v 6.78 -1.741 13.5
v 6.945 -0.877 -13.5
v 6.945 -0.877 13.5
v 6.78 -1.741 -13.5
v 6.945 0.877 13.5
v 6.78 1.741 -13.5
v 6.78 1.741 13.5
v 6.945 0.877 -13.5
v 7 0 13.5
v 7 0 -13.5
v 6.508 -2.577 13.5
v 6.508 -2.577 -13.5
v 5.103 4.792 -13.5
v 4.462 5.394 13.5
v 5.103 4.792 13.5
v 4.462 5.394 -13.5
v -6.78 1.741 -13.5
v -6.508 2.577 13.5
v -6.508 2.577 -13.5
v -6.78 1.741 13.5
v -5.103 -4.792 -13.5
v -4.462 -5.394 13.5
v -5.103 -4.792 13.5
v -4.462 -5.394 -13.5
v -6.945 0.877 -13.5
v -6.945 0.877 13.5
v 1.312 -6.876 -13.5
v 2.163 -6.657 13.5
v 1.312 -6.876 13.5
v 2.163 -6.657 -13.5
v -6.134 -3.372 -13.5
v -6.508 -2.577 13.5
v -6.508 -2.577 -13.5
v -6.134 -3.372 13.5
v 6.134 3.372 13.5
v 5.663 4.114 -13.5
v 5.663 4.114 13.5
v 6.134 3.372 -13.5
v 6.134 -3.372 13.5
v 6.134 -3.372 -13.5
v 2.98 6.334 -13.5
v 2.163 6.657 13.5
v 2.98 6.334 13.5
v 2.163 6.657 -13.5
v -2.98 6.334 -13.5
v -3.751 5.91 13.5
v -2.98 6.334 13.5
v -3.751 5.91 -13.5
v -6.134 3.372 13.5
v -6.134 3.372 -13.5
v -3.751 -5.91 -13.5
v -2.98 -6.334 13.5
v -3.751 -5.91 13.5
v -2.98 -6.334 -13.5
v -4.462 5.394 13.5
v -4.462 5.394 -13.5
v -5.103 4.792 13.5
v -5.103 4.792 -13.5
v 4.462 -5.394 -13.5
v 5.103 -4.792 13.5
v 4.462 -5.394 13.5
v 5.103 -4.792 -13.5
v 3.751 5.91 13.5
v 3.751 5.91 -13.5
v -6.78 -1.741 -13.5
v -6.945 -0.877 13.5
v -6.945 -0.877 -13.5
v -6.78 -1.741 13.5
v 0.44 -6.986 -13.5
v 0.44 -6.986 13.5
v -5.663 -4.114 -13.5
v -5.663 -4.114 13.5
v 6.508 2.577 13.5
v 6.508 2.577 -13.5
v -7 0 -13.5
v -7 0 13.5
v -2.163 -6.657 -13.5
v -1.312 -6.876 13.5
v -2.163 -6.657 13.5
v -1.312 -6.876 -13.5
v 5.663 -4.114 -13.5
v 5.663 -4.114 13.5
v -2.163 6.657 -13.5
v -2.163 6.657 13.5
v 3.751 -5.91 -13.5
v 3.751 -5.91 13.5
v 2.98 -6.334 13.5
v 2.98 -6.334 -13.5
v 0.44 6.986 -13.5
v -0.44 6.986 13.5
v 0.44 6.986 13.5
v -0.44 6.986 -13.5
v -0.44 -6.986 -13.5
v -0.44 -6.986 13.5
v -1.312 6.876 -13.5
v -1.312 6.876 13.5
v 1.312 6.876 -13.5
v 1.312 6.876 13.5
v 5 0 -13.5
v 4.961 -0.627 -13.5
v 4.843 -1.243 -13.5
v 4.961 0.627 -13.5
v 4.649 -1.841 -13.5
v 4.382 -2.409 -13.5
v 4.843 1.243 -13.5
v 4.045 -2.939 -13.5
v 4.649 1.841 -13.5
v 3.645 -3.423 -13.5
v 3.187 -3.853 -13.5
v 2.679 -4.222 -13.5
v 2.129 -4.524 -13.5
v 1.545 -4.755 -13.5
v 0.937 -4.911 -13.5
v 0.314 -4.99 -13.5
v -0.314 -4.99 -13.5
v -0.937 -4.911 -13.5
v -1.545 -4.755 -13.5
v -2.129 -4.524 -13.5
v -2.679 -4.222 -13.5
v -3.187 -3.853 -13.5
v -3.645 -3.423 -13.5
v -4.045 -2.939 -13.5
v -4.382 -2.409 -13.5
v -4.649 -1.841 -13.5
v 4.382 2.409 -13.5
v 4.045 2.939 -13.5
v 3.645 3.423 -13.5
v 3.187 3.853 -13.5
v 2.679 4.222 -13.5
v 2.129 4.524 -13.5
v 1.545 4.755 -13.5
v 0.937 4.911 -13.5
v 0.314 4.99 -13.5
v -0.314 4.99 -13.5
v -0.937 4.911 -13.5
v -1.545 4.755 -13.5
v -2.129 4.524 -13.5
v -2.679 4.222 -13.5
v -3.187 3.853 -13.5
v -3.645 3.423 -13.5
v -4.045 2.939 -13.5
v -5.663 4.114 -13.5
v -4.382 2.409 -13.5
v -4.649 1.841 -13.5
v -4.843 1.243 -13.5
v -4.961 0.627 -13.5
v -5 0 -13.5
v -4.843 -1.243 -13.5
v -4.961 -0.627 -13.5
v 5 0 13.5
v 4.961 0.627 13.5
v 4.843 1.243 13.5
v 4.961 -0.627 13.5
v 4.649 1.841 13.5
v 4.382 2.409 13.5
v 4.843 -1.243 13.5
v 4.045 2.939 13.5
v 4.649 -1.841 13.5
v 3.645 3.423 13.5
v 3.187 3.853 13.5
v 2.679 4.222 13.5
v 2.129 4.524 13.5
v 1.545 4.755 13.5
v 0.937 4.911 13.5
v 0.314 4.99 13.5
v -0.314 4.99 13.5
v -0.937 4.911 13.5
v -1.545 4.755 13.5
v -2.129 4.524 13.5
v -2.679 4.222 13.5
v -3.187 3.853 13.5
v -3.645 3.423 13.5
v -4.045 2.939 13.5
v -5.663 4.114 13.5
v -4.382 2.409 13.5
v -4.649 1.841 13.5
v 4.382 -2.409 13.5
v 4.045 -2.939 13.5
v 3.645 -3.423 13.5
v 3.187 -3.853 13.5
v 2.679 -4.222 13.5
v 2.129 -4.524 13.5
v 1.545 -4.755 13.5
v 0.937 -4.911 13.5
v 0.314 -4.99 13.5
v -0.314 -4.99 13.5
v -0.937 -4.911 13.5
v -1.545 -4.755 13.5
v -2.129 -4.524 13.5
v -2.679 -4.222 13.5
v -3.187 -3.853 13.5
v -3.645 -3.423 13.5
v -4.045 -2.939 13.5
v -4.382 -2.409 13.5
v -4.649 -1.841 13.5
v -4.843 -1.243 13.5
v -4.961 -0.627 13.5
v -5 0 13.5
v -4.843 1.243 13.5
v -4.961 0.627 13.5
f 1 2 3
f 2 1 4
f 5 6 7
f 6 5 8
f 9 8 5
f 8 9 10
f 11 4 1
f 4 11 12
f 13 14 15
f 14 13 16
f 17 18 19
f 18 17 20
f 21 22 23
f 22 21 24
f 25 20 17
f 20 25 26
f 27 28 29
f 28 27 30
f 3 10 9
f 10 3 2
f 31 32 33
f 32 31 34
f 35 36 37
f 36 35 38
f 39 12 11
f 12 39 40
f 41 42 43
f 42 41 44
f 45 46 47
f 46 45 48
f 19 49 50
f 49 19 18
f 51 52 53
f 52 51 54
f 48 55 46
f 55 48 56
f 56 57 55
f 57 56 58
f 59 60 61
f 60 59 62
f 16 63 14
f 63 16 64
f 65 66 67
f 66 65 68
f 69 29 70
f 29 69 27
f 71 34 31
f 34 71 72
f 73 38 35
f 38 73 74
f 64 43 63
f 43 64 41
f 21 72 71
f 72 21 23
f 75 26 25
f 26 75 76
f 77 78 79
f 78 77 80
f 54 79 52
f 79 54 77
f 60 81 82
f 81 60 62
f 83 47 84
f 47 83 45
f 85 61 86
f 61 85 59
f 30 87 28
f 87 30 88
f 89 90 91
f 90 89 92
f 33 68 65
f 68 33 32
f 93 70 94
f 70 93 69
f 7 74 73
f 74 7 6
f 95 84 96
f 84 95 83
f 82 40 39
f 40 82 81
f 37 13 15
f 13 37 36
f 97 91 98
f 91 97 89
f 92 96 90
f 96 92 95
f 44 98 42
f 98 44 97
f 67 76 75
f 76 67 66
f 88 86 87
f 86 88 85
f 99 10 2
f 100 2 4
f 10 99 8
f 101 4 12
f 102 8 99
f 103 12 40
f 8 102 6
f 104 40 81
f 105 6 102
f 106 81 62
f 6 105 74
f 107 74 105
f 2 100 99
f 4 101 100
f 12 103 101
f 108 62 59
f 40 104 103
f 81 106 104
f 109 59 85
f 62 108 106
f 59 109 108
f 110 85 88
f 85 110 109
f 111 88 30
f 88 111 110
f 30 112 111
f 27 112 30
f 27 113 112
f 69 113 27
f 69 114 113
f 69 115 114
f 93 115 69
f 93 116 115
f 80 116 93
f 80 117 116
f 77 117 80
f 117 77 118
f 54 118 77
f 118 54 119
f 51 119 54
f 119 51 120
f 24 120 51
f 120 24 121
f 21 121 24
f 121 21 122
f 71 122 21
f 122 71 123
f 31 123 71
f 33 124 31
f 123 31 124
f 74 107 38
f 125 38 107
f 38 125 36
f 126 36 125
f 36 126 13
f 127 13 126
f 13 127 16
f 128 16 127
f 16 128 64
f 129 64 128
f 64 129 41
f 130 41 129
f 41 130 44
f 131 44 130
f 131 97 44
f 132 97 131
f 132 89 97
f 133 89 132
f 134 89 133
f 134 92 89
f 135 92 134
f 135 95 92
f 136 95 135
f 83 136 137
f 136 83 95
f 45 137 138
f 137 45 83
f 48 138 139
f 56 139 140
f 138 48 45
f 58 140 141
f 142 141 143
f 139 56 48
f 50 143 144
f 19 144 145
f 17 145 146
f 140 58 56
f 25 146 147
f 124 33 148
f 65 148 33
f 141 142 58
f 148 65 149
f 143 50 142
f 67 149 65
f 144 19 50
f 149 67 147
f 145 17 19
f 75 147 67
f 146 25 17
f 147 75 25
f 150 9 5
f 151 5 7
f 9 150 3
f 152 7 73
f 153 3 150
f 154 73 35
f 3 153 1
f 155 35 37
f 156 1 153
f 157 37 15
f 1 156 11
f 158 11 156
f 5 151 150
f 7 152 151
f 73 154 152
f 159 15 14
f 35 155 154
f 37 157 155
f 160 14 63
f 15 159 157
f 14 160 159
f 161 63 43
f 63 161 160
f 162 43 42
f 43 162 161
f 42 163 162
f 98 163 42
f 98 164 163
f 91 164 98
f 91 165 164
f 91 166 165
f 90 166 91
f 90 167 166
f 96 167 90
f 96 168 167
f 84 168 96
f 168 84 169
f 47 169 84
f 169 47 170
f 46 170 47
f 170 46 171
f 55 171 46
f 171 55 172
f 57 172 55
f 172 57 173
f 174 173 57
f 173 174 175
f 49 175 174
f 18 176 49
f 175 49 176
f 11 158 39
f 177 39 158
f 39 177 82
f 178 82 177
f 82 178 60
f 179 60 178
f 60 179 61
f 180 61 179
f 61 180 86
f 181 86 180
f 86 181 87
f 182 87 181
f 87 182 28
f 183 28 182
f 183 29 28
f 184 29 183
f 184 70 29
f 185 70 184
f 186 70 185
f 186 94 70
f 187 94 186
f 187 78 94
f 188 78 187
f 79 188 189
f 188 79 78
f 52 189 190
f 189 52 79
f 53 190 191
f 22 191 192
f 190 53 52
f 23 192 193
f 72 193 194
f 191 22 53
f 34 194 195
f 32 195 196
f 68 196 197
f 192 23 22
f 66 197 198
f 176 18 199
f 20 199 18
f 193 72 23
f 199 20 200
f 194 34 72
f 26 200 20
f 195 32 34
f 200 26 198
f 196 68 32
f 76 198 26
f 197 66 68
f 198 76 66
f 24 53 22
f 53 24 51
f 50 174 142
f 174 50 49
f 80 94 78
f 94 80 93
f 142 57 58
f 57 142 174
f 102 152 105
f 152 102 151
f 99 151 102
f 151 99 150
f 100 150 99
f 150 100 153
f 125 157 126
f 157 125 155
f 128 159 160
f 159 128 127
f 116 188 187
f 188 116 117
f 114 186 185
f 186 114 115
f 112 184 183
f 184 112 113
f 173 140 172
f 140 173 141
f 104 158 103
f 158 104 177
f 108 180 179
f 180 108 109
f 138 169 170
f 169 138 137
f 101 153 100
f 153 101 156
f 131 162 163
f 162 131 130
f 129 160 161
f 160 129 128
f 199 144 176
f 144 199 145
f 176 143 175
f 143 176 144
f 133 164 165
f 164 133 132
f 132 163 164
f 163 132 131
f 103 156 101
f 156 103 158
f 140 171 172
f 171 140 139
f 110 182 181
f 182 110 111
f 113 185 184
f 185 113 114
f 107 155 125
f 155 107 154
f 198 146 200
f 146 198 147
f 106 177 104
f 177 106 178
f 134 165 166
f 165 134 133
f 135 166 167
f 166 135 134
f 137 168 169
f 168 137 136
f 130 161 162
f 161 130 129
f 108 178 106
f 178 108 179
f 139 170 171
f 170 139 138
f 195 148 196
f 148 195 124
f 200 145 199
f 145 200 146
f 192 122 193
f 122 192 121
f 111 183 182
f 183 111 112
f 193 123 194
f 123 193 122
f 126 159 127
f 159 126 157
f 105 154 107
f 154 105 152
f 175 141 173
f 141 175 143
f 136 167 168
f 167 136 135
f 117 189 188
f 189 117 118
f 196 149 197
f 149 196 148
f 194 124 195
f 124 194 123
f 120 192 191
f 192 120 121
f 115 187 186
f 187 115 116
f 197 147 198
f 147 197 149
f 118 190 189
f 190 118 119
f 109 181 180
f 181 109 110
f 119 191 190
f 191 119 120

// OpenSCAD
$fn = 50;


difference() {
	union() {
		translate(v = [0, 0, -13.5000000000]) {
			cylinder(h = 27, r = 7.0000000000);
		}
	}
	union() {
		translate(v = [0, 0, -100.0000000000]) {
			cylinder(h = 200, r = 5.0000000000);
		}
	}
}
